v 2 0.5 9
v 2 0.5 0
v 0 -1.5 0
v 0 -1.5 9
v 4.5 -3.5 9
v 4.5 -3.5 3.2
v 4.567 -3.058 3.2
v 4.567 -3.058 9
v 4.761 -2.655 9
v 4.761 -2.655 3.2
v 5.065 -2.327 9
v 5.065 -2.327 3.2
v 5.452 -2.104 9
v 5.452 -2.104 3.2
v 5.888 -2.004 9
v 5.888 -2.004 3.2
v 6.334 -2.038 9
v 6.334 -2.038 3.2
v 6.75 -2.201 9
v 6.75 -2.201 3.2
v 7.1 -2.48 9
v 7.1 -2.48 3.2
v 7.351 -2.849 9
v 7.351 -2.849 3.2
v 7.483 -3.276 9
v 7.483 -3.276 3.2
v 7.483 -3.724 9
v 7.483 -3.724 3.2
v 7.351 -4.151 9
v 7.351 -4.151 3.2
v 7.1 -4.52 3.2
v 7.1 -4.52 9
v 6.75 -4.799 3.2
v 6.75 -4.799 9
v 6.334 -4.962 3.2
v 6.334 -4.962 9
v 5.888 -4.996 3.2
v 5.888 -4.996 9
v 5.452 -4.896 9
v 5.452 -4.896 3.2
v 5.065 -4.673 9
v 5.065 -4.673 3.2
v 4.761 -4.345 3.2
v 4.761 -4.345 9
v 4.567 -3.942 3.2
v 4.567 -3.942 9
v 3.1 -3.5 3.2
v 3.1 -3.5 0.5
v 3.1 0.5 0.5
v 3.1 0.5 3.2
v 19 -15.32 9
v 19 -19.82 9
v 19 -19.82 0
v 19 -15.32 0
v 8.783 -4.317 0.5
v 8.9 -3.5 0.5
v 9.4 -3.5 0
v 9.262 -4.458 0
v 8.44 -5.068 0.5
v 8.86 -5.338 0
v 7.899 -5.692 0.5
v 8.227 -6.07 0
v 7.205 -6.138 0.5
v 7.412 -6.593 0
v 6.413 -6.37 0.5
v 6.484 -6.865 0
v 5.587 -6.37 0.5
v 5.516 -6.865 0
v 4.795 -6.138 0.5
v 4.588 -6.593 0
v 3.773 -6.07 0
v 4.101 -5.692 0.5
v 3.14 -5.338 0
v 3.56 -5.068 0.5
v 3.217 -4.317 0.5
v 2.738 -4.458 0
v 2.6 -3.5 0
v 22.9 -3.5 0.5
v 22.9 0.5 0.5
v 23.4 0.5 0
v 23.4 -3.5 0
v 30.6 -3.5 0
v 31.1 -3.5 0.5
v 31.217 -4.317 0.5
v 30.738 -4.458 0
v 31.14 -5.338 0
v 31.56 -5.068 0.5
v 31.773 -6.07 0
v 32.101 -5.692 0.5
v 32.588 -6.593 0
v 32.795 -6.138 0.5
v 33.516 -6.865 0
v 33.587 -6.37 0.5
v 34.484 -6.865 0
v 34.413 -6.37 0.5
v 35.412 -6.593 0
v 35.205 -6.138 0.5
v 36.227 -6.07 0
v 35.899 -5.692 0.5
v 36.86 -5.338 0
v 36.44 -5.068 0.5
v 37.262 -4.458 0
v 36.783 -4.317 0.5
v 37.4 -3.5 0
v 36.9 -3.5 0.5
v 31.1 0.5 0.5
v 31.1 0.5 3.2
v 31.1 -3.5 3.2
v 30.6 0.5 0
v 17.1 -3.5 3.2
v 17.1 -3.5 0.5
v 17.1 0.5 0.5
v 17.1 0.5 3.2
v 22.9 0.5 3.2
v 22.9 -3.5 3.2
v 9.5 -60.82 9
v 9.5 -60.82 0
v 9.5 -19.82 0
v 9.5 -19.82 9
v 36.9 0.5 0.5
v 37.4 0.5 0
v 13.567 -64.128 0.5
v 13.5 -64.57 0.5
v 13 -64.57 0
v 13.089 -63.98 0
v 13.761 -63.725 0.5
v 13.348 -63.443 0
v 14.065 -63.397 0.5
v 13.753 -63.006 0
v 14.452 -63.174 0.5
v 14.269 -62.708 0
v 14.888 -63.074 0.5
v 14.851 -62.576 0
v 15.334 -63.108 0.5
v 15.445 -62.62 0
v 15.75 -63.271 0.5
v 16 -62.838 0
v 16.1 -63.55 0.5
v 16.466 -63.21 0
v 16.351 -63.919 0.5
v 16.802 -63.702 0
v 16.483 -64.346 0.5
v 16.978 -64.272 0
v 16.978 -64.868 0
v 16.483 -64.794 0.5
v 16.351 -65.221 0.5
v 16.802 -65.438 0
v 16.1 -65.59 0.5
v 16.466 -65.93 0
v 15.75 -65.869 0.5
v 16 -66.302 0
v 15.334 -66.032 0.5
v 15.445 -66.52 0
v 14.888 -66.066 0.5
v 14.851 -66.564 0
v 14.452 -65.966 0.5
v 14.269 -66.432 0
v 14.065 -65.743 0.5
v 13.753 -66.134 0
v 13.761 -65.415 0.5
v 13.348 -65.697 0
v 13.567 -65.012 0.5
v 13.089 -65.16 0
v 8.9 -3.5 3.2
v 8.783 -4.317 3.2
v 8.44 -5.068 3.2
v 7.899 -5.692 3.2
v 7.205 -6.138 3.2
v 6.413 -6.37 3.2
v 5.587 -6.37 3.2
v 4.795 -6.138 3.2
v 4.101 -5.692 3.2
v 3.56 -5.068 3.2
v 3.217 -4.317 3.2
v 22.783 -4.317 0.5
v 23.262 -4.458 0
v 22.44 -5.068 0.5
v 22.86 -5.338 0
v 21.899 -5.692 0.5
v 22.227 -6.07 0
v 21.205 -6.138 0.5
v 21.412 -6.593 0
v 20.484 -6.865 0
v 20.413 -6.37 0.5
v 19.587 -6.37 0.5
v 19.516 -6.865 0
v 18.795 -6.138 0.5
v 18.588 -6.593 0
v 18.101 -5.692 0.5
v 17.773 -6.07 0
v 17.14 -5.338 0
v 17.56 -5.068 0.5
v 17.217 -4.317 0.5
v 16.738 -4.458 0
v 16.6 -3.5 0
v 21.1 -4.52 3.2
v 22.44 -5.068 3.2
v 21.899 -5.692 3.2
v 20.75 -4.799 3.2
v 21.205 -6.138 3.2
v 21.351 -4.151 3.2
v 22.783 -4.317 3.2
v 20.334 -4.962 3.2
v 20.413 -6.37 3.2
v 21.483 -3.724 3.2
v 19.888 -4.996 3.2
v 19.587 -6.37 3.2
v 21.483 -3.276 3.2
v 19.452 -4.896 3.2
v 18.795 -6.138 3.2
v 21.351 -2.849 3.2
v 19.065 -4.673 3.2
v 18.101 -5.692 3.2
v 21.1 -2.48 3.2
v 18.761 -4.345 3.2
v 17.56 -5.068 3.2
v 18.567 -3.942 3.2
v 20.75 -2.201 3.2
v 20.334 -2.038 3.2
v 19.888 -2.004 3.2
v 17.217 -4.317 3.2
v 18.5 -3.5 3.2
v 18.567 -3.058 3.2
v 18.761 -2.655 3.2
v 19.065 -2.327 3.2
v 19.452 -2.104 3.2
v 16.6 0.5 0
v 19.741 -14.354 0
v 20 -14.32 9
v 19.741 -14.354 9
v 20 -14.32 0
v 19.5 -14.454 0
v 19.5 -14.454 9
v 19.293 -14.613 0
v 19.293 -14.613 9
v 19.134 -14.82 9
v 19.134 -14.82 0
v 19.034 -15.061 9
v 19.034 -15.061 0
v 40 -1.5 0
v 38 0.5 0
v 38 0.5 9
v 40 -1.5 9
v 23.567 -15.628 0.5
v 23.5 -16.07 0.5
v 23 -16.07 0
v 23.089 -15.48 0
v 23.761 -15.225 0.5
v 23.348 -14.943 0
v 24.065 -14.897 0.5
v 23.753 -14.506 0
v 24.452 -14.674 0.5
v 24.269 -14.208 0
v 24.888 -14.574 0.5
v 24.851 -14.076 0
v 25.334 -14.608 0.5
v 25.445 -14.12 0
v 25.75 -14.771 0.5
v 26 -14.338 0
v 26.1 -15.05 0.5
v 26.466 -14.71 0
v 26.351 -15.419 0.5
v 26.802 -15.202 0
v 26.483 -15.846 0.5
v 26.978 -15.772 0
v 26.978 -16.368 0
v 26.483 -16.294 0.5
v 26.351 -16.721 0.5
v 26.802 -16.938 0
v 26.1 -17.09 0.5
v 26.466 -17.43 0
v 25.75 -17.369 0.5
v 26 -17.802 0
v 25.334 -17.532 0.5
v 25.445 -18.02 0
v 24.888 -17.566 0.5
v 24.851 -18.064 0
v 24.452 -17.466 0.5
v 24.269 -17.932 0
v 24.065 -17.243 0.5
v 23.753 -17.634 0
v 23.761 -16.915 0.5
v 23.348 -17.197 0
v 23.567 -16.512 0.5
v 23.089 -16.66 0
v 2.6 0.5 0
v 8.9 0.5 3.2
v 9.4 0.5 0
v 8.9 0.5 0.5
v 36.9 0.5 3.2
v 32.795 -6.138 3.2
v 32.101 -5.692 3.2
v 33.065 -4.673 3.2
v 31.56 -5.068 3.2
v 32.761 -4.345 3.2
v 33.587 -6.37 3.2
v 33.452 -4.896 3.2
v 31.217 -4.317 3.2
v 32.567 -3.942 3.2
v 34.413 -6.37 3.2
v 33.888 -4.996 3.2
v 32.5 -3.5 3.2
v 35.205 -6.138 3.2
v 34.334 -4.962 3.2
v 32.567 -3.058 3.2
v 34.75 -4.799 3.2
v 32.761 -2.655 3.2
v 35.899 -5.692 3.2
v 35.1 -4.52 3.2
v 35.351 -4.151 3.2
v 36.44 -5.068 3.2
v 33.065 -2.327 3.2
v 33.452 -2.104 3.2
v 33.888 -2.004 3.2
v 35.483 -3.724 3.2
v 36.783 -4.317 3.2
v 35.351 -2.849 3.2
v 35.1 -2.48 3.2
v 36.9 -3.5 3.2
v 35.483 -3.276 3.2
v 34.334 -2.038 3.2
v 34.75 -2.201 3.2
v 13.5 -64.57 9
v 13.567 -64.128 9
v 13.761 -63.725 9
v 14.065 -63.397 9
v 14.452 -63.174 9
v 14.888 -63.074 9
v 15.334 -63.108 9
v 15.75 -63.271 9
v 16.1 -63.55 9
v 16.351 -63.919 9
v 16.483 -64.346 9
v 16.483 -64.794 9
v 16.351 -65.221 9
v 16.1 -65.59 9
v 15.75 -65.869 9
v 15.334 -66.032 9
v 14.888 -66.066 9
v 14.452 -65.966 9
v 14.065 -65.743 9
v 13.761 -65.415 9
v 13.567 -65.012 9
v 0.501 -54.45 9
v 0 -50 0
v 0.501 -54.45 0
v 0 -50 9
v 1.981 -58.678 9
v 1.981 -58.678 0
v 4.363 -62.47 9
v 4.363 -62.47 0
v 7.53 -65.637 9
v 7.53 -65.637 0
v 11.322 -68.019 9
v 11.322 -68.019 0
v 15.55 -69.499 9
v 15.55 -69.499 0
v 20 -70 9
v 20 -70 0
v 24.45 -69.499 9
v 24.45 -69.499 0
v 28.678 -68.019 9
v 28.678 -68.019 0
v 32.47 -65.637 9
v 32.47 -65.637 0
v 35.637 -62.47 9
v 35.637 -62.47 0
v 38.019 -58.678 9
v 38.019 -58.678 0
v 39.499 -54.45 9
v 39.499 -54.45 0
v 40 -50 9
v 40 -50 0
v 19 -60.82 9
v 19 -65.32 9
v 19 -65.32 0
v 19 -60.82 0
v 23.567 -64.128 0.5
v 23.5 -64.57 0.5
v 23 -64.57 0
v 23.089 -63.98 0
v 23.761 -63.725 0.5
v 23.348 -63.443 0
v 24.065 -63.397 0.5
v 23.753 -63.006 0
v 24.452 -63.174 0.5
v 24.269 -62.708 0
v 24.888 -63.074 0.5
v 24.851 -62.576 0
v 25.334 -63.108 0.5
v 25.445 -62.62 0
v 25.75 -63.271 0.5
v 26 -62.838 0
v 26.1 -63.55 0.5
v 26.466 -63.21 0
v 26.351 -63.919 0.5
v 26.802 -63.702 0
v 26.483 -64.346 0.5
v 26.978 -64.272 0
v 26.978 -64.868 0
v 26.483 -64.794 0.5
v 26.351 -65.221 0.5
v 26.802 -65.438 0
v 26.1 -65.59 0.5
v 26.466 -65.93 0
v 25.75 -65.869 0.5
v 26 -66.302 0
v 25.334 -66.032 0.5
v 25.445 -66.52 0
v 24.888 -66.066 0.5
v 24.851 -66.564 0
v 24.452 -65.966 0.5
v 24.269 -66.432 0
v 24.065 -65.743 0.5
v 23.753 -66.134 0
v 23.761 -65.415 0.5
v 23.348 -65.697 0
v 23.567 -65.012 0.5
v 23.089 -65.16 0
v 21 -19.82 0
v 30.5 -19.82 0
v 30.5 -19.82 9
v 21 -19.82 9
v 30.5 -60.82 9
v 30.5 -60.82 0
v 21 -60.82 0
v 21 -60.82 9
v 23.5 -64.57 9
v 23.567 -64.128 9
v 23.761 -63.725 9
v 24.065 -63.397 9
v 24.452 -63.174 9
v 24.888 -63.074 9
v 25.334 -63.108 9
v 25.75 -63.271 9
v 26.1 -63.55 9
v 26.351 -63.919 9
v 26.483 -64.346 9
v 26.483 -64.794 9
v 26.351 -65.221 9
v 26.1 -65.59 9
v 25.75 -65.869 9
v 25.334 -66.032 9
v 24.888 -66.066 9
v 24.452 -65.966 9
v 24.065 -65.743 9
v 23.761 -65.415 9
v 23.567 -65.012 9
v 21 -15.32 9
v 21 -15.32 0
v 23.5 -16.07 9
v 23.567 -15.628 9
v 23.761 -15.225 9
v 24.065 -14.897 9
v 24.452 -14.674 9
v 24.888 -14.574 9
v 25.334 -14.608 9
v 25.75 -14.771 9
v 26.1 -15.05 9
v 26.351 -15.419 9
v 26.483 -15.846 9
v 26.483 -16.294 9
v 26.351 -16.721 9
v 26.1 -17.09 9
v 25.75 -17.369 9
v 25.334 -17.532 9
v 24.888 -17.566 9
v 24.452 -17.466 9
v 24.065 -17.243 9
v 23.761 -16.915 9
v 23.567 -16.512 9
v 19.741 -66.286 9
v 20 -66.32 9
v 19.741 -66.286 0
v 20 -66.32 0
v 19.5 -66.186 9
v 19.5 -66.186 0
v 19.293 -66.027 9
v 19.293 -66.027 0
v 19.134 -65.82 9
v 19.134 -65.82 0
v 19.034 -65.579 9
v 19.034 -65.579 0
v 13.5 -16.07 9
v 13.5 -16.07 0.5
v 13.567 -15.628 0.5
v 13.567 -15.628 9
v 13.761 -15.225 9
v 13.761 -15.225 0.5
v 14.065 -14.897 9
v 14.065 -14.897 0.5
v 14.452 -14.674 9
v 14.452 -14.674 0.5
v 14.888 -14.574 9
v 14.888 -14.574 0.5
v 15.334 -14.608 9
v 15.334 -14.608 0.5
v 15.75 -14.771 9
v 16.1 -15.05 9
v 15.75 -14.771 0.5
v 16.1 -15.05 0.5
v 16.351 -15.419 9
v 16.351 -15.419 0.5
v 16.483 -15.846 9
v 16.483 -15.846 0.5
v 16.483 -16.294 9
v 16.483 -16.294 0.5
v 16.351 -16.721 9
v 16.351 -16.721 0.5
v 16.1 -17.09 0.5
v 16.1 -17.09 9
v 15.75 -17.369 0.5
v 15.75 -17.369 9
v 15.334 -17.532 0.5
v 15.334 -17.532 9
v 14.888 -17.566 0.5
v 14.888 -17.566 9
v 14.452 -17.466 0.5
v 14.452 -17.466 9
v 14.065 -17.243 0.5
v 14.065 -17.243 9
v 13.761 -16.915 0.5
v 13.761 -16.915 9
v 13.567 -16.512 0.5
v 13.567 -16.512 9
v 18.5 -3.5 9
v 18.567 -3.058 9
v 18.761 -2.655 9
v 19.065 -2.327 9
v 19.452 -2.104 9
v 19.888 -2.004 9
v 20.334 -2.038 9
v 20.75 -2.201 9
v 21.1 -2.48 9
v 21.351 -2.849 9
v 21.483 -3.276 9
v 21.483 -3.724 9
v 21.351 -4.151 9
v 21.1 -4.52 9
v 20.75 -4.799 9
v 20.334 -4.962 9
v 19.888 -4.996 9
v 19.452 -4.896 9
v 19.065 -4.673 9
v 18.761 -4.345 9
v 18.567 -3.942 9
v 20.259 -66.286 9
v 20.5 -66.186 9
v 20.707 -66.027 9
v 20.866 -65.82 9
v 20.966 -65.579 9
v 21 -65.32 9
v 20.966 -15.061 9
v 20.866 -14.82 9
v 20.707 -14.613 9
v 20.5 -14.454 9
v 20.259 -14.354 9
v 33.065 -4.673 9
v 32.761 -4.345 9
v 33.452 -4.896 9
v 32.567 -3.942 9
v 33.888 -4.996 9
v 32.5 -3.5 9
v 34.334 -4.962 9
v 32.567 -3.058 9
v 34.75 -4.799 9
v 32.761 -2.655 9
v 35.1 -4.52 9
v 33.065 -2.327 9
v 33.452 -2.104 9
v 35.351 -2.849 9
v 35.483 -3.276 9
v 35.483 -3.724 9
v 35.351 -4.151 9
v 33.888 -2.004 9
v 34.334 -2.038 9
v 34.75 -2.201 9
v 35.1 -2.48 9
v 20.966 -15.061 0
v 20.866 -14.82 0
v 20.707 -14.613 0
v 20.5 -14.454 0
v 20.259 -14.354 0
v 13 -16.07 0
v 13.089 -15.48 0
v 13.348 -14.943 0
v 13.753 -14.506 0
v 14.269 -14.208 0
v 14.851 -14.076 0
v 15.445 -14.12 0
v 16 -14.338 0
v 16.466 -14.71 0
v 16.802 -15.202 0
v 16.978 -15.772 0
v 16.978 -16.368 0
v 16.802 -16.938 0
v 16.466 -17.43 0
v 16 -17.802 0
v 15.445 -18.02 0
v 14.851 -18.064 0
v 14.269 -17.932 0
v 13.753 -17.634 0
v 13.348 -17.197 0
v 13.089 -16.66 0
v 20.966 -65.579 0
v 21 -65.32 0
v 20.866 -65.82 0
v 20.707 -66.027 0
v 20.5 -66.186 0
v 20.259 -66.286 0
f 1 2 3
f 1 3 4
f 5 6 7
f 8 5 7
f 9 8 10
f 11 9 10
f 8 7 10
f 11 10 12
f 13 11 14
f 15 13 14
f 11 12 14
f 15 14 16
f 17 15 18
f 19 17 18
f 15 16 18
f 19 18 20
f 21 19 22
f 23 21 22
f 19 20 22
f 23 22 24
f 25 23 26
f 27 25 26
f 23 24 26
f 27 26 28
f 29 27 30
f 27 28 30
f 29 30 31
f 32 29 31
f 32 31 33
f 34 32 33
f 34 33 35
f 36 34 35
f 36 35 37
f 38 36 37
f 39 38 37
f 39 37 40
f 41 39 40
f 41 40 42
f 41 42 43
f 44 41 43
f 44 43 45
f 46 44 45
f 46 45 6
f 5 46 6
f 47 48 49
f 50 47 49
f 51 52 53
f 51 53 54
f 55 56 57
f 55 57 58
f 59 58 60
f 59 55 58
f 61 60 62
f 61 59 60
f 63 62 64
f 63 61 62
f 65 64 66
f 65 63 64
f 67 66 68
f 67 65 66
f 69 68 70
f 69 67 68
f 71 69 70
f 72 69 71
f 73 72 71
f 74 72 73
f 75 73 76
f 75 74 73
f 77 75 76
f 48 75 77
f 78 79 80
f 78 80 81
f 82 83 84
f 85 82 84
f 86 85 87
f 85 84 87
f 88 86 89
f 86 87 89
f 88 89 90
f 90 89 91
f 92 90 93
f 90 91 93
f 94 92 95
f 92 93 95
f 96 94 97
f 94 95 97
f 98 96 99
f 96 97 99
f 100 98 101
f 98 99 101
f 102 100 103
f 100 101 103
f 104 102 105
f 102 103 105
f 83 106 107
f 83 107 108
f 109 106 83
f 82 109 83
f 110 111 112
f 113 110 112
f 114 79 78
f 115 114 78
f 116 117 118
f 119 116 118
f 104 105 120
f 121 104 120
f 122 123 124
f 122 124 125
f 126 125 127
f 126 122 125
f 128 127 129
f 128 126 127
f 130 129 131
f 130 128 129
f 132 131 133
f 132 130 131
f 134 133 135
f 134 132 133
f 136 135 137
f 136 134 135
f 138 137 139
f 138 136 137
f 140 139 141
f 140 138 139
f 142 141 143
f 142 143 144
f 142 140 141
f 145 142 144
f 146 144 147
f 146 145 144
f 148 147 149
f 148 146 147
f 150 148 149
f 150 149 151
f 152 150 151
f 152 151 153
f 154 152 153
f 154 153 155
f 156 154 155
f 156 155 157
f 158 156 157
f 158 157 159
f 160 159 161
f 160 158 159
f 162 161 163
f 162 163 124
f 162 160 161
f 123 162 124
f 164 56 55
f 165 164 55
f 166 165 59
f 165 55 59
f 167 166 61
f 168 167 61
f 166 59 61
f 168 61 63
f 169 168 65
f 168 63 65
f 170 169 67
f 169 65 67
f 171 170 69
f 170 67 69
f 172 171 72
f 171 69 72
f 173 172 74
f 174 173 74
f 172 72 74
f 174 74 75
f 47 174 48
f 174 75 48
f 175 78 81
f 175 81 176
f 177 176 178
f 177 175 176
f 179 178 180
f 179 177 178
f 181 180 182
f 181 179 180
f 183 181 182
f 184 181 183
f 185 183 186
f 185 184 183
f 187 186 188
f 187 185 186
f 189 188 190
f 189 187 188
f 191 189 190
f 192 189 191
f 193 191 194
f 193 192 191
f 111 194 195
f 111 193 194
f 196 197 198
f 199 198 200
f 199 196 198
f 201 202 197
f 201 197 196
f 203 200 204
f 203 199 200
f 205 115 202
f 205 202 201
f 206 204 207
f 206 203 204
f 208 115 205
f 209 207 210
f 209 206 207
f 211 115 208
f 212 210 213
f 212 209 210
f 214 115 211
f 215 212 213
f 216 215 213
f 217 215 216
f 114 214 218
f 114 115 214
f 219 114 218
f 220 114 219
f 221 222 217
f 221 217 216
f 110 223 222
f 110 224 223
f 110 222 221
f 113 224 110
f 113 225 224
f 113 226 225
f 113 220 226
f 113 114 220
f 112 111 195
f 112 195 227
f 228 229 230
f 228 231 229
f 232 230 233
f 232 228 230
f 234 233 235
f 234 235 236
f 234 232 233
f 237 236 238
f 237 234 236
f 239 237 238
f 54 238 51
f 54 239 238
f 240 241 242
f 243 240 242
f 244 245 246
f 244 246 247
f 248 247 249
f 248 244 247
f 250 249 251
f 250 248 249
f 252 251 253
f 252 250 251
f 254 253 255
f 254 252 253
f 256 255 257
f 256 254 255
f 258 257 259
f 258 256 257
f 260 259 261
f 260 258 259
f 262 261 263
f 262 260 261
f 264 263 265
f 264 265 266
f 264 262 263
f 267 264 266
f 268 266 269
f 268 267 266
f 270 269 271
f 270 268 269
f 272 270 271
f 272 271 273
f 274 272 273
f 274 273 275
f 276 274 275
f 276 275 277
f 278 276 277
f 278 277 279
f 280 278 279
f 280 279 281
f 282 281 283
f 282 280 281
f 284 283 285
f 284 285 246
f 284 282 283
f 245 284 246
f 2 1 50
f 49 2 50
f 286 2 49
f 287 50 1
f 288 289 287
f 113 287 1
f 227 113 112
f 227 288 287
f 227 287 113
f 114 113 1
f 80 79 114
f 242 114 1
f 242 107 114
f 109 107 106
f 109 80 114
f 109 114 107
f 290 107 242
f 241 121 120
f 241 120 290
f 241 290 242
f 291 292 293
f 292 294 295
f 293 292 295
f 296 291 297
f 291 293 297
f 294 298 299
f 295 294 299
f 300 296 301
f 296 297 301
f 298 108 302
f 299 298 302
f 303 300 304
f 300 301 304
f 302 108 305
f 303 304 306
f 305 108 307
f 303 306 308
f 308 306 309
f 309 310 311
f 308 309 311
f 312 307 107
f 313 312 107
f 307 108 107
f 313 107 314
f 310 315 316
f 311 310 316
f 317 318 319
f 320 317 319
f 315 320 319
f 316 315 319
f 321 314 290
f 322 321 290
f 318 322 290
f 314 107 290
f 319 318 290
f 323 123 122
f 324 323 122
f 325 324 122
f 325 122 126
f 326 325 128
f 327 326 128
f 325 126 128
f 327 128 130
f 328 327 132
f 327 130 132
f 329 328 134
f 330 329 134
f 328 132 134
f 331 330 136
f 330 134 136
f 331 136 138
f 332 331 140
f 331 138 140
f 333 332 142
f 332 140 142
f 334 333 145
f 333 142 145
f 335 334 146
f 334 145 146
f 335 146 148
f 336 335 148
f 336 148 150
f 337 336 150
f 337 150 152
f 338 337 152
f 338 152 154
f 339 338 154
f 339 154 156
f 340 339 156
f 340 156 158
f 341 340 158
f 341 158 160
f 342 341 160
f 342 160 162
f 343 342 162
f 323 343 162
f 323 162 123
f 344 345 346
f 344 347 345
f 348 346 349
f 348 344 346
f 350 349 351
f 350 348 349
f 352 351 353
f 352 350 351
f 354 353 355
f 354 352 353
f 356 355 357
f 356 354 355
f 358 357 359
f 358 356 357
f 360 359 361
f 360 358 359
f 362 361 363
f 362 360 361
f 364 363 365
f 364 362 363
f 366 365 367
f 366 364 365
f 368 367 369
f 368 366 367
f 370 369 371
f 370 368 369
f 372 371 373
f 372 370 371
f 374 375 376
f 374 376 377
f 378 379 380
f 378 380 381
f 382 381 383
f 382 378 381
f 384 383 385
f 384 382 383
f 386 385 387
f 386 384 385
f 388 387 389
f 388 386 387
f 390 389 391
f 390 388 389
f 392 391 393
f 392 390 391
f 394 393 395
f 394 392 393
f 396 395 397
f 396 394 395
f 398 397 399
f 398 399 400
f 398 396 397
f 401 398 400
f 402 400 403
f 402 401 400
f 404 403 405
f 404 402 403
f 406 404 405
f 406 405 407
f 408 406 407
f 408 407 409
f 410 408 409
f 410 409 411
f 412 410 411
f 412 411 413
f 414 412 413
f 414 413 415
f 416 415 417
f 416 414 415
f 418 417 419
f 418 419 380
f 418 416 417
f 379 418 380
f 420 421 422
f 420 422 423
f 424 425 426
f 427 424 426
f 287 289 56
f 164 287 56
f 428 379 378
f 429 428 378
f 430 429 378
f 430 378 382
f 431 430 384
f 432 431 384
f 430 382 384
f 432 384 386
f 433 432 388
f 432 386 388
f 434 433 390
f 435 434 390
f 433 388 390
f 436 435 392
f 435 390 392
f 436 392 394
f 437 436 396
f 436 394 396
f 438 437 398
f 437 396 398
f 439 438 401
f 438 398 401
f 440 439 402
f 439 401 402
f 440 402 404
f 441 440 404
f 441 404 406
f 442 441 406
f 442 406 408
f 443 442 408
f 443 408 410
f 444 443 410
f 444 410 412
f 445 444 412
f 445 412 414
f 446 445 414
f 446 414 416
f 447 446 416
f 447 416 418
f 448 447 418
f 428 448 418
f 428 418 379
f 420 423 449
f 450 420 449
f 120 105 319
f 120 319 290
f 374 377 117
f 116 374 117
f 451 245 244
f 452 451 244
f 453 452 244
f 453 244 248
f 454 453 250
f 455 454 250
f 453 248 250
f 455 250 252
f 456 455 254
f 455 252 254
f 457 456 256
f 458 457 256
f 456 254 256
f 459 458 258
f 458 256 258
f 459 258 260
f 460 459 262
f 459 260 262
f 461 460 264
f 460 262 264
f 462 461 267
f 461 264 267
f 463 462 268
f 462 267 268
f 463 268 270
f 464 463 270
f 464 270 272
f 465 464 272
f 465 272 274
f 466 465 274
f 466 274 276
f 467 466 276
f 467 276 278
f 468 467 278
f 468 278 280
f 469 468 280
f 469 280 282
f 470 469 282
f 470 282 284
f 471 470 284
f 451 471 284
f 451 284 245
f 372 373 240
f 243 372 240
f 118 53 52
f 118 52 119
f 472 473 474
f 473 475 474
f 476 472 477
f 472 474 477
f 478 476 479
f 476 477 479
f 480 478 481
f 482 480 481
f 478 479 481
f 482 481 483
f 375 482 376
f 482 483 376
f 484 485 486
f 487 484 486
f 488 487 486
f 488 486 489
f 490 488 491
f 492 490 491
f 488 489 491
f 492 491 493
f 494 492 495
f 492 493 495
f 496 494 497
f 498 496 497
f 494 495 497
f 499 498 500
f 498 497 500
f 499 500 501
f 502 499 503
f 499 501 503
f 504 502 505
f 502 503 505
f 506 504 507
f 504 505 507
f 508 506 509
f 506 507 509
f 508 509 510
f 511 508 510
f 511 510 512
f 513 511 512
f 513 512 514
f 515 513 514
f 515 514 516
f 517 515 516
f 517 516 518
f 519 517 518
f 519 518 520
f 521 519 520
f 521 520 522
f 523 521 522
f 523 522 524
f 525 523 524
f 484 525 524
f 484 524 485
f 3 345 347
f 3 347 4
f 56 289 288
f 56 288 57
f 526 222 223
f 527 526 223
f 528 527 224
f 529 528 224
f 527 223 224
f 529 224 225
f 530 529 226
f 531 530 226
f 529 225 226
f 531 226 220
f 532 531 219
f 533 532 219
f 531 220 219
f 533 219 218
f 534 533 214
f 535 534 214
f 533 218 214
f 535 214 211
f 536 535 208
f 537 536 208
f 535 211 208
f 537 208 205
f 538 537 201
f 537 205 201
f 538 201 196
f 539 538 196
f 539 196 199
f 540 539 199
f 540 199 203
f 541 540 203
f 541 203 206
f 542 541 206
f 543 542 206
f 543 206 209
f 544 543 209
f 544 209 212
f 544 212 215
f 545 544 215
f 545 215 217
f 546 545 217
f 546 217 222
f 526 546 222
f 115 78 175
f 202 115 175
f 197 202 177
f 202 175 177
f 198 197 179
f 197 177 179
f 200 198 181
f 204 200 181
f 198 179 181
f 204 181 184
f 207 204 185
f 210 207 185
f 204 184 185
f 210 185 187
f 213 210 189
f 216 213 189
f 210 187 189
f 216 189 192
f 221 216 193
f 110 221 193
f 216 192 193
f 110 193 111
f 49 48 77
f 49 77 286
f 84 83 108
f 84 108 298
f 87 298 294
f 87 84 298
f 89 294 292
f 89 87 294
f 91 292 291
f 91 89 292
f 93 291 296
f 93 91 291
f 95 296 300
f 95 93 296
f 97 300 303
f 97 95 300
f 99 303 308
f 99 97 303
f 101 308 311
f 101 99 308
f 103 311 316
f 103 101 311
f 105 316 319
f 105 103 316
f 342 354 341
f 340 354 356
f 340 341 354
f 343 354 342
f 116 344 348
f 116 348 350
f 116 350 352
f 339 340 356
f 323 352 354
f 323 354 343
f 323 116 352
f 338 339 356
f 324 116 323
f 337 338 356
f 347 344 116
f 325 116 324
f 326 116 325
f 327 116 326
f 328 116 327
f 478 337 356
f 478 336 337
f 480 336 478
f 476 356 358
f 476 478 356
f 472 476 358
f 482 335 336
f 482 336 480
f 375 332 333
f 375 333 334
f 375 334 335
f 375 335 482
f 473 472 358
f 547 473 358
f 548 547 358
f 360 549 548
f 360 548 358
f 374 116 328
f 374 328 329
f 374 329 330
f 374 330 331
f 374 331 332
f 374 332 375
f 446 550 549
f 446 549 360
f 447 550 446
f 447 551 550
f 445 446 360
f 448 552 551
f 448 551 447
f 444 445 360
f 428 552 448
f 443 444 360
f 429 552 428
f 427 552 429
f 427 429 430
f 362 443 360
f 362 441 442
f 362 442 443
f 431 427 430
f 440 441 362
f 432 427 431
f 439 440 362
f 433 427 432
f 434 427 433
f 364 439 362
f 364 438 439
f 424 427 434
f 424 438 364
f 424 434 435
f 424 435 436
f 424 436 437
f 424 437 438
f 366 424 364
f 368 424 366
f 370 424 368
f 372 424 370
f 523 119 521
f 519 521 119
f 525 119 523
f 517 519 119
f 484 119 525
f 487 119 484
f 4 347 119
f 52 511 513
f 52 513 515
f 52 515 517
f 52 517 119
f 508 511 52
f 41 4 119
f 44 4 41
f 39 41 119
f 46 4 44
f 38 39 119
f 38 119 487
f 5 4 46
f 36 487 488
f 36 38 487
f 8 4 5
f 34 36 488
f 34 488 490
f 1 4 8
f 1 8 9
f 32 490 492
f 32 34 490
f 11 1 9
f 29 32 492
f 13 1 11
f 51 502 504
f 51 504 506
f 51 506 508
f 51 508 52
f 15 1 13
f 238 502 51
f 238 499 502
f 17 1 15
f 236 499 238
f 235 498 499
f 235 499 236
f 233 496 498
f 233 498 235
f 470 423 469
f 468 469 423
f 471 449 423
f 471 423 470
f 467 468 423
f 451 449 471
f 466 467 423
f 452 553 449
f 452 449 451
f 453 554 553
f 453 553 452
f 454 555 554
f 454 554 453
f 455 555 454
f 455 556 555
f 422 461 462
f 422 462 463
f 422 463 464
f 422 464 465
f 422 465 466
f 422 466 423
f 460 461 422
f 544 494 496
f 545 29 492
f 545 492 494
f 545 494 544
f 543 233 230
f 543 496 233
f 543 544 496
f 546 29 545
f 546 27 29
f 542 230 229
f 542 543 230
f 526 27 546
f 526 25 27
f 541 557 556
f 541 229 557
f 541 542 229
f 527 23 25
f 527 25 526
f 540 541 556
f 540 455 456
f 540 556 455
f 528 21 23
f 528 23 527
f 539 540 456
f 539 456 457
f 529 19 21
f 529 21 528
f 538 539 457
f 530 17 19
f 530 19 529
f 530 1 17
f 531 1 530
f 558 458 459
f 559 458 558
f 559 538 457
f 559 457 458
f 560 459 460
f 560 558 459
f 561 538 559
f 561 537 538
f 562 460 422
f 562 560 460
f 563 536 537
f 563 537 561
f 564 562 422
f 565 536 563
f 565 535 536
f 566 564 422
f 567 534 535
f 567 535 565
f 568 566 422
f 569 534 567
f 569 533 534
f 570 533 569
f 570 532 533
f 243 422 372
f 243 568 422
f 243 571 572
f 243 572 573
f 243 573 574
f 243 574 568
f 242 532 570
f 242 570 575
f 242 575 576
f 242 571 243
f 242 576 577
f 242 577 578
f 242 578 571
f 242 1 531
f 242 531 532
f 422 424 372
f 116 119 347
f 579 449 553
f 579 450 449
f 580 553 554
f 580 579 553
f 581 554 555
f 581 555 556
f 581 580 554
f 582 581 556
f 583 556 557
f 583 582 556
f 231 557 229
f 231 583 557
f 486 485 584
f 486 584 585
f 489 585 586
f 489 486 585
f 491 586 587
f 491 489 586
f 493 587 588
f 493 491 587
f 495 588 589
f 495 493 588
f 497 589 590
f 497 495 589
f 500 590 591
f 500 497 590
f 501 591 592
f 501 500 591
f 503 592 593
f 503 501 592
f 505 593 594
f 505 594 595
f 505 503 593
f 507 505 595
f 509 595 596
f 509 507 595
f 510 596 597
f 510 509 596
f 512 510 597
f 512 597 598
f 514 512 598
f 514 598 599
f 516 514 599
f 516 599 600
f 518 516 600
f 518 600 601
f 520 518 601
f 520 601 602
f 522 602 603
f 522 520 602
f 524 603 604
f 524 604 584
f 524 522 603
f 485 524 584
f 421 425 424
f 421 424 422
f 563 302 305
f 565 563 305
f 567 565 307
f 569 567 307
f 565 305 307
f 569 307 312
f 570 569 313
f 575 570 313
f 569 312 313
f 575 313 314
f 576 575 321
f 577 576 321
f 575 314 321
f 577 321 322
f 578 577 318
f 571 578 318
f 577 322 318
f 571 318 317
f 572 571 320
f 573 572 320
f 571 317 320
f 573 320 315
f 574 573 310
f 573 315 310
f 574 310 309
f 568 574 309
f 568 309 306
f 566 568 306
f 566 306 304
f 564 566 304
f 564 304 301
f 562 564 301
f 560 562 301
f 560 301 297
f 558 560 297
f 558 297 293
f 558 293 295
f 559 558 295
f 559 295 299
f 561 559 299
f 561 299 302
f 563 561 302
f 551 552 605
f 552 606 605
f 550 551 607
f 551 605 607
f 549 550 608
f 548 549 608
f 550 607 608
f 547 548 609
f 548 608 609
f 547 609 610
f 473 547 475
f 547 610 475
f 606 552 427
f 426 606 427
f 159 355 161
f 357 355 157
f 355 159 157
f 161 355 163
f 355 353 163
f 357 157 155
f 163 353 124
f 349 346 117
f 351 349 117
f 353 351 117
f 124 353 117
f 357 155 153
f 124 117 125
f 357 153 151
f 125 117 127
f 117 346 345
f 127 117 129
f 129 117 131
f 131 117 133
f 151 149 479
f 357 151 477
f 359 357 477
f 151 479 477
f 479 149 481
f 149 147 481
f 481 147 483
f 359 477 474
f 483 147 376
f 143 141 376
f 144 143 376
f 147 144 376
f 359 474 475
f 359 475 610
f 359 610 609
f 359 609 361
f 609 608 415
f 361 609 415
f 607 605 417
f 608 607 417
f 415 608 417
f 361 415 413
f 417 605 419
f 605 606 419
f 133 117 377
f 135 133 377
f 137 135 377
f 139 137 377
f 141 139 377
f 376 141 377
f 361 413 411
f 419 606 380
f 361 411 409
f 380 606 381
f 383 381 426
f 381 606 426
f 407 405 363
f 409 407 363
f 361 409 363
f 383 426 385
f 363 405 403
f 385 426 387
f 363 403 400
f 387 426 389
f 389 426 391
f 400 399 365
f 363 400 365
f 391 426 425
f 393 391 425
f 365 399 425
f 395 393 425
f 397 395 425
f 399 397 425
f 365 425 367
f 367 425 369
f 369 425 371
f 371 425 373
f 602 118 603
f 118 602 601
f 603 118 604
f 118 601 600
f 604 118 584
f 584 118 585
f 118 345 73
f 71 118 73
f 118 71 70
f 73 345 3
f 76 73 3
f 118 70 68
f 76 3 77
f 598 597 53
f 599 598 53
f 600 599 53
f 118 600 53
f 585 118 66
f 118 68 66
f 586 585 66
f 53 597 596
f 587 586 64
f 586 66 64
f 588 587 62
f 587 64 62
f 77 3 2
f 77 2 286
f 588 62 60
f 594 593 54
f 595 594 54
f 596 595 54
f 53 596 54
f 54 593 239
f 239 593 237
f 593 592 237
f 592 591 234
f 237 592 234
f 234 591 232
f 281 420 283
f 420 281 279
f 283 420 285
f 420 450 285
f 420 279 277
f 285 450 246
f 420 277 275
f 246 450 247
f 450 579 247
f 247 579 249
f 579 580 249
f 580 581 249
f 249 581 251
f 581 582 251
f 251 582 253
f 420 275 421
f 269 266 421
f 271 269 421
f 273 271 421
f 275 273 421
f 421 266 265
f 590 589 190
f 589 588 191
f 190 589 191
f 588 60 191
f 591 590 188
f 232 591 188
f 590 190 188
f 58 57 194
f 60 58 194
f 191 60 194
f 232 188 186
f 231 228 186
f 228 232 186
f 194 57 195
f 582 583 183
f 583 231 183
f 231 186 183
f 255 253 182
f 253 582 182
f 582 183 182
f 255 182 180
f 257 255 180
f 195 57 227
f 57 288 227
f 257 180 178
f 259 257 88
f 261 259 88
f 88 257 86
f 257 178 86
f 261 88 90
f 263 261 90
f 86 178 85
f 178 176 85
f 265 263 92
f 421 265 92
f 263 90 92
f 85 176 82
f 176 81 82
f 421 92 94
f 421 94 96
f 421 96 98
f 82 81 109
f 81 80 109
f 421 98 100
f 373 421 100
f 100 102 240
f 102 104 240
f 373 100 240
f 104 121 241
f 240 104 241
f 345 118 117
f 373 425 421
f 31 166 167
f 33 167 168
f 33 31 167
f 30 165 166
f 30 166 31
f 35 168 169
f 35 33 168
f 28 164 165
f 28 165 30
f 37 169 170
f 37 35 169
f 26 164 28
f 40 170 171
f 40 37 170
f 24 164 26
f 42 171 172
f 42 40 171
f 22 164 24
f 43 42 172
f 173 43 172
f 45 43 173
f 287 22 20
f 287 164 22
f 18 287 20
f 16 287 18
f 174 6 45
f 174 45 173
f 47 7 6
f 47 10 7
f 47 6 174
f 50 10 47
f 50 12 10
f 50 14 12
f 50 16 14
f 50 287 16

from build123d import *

# Parameters (mm, degrees)
SKETCH_1_W          = 40
SKETCH_1_H          = 70.5
EXTRUDE_1_DEPTH     = 9
CHAMFER_1_SIZE      = 2
FILLET_3_R          = 20
SKETCH_2_W          = 21
SKETCH_2_H          = 41
CUT_EXTRUDE_1_DEPTH = 10
SKETCH_3_W          = 2
SKETCH_3_H          = 5.5
CUT_EXTRUDE_2_DEPTH = 10
SKETCH_4_R          = 1.5
CUT_EXTRUDE_3_DEPTH = 10
SKETCH_5_R          = 1.5
CUT_EXTRUDE_4_DEPTH = 10
FILLET_4_R          = 1
CUT_EXTRUDE_5_DEPTH = 3.2
CHAMFER_2_SIZE      = 0.5


with BuildPart() as part:
    # 草图1 → 凸台-拉伸1 (new body)
    with BuildSketch(Plane.XY):
        with Locations((20, -34.75)):
            Rectangle(SKETCH_1_W, SKETCH_1_H)
    extrude(amount=EXTRUDE_1_DEPTH)

    # 倒角1
    chamfer_1_edges = [part.edges().sort_by_distance(p)[0] for p in [
        (0, 0.5, 4.5),
        (40, 0.5, 4.5),
    ]]
    chamfer(chamfer_1_edges, length=CHAMFER_1_SIZE)

    # 圆角3
    fillet_3_edges = [part.edges().sort_by_distance(p)[0] for p in [
        (0, -70, 4.5),
        (40, -70, 4.5),
    ]]
    fillet(fillet_3_edges, radius=FILLET_3_R - 0.0001)  # a hair under: the kernel refuses the full size

    # 草图2 → 切除-拉伸1 (cut)
    with BuildSketch(Plane(origin=(0, 0, 0), x_dir=(-1, 0, 0), z_dir=(0, 0, -1))):
        with Locations((-20, -40.32)):
            Rectangle(SKETCH_2_W, SKETCH_2_H)
    extrude(amount=-CUT_EXTRUDE_1_DEPTH, mode=Mode.SUBTRACT)

    # 草图3 → 切除-拉伸2 (cut)
    with BuildSketch(Plane.XY.offset(9)):
        with Locations((20, -17.07)):
            Rectangle(SKETCH_3_W, SKETCH_3_H)
        with Locations((20, -63.57)):
            Rectangle(SKETCH_3_W, SKETCH_3_H)
    extrude(amount=-CUT_EXTRUDE_2_DEPTH, mode=Mode.SUBTRACT)

    # 草图4 → 切除-拉伸3 (cut)
    with BuildSketch(Plane(origin=(0, 0, 0), x_dir=(-1, 0, 0), z_dir=(0, 0, -1))):
        with Locations((-25, -16.07)):
            Circle(SKETCH_4_R)
        with Locations((-15, -16.07)):
            Circle(SKETCH_4_R)
        with Locations((-25, -64.57)):
            Circle(SKETCH_4_R)
        with Locations((-15, -64.57)):
            Circle(SKETCH_4_R)
    extrude(amount=-CUT_EXTRUDE_3_DEPTH, mode=Mode.SUBTRACT)

    # 草图5 → 切除-拉伸4 (cut)
    with BuildSketch(Plane(origin=(0, 0, 0), x_dir=(-1, 0, 0), z_dir=(0, 0, -1))):
        with Locations((-34, -3.5)):
            Circle(SKETCH_5_R)
        with Locations((-20, -3.5)):
            Circle(SKETCH_5_R)
        with Locations((-6, -3.5)):
            Circle(SKETCH_5_R)
    extrude(amount=-CUT_EXTRUDE_4_DEPTH, mode=Mode.SUBTRACT)

    # 圆角4
    fillet_4_edges = [part.edges().sort_by_distance(p)[0] for p in [
        (21, -66.32, 4.5),
        (19, -66.32, 4.5),
        (21, -14.32, 4.5),
        (19, -14.32, 4.5),
    ]]
    fillet(fillet_4_edges, radius=FILLET_4_R - 0.0001)  # a hair under: the kernel refuses the full size

    # 草图7 → 切除-拉伸5 (cut)
    with BuildSketch(Plane(origin=(0, 0, 0), x_dir=(-1, 0, 0), z_dir=(0, 0, -1))):
        with BuildLine():
            Line((-36.9, -3.5), (-36.9, 0.5))
            Line((-36.9, 0.5), (-31.1, 0.5))
            Line((-31.1, 0.5), (-31.1, -3.5))
            ThreePointArc((-31.1, -3.5), (-34, -6.4), (-36.9, -3.5))
        make_face()
        with BuildLine():
            Line((-17.1, -3.5), (-17.1, 0.5))
            Line((-17.1, 0.5), (-22.9, 0.5))
            Line((-22.9, 0.5), (-22.9, -3.5))
            ThreePointArc((-22.9, -3.5), (-20, -6.4), (-17.1, -3.5))
        make_face()
        with BuildLine():
            Line((-3.1, -3.5), (-3.1, 0.5))
            Line((-3.1, 0.5), (-8.9, 0.5))
            Line((-8.9, 0.5), (-8.9, -3.5))
            ThreePointArc((-8.9, -3.5), (-6, -6.4), (-3.1, -3.5))
        make_face()
    extrude(amount=-CUT_EXTRUDE_5_DEPTH, mode=Mode.SUBTRACT)

    # 倒角2
    chamfer_2_edges = [part.edges().sort_by_distance(p)[0] for p in [
        (16.5, -16.07, 0),
        (26.5, -64.57, 0),
        (16.5, -64.57, 0),
        (26.5, -16.07, 0),
        (34, -6.4, 0),
        (31.1, -1.5, 0),
        (36.9, -1.5, 0),
        (20, -6.4, 0),
        (17.1, -1.5, 0),
        (22.9, -1.5, 0),
        (6, -6.4, 0),
        (3.1, -1.5, 0),
        (8.9, -1.5, 0),
    ]]
    chamfer(chamfer_2_edges, length=CHAMFER_2_SIZE)


solid = part.part
